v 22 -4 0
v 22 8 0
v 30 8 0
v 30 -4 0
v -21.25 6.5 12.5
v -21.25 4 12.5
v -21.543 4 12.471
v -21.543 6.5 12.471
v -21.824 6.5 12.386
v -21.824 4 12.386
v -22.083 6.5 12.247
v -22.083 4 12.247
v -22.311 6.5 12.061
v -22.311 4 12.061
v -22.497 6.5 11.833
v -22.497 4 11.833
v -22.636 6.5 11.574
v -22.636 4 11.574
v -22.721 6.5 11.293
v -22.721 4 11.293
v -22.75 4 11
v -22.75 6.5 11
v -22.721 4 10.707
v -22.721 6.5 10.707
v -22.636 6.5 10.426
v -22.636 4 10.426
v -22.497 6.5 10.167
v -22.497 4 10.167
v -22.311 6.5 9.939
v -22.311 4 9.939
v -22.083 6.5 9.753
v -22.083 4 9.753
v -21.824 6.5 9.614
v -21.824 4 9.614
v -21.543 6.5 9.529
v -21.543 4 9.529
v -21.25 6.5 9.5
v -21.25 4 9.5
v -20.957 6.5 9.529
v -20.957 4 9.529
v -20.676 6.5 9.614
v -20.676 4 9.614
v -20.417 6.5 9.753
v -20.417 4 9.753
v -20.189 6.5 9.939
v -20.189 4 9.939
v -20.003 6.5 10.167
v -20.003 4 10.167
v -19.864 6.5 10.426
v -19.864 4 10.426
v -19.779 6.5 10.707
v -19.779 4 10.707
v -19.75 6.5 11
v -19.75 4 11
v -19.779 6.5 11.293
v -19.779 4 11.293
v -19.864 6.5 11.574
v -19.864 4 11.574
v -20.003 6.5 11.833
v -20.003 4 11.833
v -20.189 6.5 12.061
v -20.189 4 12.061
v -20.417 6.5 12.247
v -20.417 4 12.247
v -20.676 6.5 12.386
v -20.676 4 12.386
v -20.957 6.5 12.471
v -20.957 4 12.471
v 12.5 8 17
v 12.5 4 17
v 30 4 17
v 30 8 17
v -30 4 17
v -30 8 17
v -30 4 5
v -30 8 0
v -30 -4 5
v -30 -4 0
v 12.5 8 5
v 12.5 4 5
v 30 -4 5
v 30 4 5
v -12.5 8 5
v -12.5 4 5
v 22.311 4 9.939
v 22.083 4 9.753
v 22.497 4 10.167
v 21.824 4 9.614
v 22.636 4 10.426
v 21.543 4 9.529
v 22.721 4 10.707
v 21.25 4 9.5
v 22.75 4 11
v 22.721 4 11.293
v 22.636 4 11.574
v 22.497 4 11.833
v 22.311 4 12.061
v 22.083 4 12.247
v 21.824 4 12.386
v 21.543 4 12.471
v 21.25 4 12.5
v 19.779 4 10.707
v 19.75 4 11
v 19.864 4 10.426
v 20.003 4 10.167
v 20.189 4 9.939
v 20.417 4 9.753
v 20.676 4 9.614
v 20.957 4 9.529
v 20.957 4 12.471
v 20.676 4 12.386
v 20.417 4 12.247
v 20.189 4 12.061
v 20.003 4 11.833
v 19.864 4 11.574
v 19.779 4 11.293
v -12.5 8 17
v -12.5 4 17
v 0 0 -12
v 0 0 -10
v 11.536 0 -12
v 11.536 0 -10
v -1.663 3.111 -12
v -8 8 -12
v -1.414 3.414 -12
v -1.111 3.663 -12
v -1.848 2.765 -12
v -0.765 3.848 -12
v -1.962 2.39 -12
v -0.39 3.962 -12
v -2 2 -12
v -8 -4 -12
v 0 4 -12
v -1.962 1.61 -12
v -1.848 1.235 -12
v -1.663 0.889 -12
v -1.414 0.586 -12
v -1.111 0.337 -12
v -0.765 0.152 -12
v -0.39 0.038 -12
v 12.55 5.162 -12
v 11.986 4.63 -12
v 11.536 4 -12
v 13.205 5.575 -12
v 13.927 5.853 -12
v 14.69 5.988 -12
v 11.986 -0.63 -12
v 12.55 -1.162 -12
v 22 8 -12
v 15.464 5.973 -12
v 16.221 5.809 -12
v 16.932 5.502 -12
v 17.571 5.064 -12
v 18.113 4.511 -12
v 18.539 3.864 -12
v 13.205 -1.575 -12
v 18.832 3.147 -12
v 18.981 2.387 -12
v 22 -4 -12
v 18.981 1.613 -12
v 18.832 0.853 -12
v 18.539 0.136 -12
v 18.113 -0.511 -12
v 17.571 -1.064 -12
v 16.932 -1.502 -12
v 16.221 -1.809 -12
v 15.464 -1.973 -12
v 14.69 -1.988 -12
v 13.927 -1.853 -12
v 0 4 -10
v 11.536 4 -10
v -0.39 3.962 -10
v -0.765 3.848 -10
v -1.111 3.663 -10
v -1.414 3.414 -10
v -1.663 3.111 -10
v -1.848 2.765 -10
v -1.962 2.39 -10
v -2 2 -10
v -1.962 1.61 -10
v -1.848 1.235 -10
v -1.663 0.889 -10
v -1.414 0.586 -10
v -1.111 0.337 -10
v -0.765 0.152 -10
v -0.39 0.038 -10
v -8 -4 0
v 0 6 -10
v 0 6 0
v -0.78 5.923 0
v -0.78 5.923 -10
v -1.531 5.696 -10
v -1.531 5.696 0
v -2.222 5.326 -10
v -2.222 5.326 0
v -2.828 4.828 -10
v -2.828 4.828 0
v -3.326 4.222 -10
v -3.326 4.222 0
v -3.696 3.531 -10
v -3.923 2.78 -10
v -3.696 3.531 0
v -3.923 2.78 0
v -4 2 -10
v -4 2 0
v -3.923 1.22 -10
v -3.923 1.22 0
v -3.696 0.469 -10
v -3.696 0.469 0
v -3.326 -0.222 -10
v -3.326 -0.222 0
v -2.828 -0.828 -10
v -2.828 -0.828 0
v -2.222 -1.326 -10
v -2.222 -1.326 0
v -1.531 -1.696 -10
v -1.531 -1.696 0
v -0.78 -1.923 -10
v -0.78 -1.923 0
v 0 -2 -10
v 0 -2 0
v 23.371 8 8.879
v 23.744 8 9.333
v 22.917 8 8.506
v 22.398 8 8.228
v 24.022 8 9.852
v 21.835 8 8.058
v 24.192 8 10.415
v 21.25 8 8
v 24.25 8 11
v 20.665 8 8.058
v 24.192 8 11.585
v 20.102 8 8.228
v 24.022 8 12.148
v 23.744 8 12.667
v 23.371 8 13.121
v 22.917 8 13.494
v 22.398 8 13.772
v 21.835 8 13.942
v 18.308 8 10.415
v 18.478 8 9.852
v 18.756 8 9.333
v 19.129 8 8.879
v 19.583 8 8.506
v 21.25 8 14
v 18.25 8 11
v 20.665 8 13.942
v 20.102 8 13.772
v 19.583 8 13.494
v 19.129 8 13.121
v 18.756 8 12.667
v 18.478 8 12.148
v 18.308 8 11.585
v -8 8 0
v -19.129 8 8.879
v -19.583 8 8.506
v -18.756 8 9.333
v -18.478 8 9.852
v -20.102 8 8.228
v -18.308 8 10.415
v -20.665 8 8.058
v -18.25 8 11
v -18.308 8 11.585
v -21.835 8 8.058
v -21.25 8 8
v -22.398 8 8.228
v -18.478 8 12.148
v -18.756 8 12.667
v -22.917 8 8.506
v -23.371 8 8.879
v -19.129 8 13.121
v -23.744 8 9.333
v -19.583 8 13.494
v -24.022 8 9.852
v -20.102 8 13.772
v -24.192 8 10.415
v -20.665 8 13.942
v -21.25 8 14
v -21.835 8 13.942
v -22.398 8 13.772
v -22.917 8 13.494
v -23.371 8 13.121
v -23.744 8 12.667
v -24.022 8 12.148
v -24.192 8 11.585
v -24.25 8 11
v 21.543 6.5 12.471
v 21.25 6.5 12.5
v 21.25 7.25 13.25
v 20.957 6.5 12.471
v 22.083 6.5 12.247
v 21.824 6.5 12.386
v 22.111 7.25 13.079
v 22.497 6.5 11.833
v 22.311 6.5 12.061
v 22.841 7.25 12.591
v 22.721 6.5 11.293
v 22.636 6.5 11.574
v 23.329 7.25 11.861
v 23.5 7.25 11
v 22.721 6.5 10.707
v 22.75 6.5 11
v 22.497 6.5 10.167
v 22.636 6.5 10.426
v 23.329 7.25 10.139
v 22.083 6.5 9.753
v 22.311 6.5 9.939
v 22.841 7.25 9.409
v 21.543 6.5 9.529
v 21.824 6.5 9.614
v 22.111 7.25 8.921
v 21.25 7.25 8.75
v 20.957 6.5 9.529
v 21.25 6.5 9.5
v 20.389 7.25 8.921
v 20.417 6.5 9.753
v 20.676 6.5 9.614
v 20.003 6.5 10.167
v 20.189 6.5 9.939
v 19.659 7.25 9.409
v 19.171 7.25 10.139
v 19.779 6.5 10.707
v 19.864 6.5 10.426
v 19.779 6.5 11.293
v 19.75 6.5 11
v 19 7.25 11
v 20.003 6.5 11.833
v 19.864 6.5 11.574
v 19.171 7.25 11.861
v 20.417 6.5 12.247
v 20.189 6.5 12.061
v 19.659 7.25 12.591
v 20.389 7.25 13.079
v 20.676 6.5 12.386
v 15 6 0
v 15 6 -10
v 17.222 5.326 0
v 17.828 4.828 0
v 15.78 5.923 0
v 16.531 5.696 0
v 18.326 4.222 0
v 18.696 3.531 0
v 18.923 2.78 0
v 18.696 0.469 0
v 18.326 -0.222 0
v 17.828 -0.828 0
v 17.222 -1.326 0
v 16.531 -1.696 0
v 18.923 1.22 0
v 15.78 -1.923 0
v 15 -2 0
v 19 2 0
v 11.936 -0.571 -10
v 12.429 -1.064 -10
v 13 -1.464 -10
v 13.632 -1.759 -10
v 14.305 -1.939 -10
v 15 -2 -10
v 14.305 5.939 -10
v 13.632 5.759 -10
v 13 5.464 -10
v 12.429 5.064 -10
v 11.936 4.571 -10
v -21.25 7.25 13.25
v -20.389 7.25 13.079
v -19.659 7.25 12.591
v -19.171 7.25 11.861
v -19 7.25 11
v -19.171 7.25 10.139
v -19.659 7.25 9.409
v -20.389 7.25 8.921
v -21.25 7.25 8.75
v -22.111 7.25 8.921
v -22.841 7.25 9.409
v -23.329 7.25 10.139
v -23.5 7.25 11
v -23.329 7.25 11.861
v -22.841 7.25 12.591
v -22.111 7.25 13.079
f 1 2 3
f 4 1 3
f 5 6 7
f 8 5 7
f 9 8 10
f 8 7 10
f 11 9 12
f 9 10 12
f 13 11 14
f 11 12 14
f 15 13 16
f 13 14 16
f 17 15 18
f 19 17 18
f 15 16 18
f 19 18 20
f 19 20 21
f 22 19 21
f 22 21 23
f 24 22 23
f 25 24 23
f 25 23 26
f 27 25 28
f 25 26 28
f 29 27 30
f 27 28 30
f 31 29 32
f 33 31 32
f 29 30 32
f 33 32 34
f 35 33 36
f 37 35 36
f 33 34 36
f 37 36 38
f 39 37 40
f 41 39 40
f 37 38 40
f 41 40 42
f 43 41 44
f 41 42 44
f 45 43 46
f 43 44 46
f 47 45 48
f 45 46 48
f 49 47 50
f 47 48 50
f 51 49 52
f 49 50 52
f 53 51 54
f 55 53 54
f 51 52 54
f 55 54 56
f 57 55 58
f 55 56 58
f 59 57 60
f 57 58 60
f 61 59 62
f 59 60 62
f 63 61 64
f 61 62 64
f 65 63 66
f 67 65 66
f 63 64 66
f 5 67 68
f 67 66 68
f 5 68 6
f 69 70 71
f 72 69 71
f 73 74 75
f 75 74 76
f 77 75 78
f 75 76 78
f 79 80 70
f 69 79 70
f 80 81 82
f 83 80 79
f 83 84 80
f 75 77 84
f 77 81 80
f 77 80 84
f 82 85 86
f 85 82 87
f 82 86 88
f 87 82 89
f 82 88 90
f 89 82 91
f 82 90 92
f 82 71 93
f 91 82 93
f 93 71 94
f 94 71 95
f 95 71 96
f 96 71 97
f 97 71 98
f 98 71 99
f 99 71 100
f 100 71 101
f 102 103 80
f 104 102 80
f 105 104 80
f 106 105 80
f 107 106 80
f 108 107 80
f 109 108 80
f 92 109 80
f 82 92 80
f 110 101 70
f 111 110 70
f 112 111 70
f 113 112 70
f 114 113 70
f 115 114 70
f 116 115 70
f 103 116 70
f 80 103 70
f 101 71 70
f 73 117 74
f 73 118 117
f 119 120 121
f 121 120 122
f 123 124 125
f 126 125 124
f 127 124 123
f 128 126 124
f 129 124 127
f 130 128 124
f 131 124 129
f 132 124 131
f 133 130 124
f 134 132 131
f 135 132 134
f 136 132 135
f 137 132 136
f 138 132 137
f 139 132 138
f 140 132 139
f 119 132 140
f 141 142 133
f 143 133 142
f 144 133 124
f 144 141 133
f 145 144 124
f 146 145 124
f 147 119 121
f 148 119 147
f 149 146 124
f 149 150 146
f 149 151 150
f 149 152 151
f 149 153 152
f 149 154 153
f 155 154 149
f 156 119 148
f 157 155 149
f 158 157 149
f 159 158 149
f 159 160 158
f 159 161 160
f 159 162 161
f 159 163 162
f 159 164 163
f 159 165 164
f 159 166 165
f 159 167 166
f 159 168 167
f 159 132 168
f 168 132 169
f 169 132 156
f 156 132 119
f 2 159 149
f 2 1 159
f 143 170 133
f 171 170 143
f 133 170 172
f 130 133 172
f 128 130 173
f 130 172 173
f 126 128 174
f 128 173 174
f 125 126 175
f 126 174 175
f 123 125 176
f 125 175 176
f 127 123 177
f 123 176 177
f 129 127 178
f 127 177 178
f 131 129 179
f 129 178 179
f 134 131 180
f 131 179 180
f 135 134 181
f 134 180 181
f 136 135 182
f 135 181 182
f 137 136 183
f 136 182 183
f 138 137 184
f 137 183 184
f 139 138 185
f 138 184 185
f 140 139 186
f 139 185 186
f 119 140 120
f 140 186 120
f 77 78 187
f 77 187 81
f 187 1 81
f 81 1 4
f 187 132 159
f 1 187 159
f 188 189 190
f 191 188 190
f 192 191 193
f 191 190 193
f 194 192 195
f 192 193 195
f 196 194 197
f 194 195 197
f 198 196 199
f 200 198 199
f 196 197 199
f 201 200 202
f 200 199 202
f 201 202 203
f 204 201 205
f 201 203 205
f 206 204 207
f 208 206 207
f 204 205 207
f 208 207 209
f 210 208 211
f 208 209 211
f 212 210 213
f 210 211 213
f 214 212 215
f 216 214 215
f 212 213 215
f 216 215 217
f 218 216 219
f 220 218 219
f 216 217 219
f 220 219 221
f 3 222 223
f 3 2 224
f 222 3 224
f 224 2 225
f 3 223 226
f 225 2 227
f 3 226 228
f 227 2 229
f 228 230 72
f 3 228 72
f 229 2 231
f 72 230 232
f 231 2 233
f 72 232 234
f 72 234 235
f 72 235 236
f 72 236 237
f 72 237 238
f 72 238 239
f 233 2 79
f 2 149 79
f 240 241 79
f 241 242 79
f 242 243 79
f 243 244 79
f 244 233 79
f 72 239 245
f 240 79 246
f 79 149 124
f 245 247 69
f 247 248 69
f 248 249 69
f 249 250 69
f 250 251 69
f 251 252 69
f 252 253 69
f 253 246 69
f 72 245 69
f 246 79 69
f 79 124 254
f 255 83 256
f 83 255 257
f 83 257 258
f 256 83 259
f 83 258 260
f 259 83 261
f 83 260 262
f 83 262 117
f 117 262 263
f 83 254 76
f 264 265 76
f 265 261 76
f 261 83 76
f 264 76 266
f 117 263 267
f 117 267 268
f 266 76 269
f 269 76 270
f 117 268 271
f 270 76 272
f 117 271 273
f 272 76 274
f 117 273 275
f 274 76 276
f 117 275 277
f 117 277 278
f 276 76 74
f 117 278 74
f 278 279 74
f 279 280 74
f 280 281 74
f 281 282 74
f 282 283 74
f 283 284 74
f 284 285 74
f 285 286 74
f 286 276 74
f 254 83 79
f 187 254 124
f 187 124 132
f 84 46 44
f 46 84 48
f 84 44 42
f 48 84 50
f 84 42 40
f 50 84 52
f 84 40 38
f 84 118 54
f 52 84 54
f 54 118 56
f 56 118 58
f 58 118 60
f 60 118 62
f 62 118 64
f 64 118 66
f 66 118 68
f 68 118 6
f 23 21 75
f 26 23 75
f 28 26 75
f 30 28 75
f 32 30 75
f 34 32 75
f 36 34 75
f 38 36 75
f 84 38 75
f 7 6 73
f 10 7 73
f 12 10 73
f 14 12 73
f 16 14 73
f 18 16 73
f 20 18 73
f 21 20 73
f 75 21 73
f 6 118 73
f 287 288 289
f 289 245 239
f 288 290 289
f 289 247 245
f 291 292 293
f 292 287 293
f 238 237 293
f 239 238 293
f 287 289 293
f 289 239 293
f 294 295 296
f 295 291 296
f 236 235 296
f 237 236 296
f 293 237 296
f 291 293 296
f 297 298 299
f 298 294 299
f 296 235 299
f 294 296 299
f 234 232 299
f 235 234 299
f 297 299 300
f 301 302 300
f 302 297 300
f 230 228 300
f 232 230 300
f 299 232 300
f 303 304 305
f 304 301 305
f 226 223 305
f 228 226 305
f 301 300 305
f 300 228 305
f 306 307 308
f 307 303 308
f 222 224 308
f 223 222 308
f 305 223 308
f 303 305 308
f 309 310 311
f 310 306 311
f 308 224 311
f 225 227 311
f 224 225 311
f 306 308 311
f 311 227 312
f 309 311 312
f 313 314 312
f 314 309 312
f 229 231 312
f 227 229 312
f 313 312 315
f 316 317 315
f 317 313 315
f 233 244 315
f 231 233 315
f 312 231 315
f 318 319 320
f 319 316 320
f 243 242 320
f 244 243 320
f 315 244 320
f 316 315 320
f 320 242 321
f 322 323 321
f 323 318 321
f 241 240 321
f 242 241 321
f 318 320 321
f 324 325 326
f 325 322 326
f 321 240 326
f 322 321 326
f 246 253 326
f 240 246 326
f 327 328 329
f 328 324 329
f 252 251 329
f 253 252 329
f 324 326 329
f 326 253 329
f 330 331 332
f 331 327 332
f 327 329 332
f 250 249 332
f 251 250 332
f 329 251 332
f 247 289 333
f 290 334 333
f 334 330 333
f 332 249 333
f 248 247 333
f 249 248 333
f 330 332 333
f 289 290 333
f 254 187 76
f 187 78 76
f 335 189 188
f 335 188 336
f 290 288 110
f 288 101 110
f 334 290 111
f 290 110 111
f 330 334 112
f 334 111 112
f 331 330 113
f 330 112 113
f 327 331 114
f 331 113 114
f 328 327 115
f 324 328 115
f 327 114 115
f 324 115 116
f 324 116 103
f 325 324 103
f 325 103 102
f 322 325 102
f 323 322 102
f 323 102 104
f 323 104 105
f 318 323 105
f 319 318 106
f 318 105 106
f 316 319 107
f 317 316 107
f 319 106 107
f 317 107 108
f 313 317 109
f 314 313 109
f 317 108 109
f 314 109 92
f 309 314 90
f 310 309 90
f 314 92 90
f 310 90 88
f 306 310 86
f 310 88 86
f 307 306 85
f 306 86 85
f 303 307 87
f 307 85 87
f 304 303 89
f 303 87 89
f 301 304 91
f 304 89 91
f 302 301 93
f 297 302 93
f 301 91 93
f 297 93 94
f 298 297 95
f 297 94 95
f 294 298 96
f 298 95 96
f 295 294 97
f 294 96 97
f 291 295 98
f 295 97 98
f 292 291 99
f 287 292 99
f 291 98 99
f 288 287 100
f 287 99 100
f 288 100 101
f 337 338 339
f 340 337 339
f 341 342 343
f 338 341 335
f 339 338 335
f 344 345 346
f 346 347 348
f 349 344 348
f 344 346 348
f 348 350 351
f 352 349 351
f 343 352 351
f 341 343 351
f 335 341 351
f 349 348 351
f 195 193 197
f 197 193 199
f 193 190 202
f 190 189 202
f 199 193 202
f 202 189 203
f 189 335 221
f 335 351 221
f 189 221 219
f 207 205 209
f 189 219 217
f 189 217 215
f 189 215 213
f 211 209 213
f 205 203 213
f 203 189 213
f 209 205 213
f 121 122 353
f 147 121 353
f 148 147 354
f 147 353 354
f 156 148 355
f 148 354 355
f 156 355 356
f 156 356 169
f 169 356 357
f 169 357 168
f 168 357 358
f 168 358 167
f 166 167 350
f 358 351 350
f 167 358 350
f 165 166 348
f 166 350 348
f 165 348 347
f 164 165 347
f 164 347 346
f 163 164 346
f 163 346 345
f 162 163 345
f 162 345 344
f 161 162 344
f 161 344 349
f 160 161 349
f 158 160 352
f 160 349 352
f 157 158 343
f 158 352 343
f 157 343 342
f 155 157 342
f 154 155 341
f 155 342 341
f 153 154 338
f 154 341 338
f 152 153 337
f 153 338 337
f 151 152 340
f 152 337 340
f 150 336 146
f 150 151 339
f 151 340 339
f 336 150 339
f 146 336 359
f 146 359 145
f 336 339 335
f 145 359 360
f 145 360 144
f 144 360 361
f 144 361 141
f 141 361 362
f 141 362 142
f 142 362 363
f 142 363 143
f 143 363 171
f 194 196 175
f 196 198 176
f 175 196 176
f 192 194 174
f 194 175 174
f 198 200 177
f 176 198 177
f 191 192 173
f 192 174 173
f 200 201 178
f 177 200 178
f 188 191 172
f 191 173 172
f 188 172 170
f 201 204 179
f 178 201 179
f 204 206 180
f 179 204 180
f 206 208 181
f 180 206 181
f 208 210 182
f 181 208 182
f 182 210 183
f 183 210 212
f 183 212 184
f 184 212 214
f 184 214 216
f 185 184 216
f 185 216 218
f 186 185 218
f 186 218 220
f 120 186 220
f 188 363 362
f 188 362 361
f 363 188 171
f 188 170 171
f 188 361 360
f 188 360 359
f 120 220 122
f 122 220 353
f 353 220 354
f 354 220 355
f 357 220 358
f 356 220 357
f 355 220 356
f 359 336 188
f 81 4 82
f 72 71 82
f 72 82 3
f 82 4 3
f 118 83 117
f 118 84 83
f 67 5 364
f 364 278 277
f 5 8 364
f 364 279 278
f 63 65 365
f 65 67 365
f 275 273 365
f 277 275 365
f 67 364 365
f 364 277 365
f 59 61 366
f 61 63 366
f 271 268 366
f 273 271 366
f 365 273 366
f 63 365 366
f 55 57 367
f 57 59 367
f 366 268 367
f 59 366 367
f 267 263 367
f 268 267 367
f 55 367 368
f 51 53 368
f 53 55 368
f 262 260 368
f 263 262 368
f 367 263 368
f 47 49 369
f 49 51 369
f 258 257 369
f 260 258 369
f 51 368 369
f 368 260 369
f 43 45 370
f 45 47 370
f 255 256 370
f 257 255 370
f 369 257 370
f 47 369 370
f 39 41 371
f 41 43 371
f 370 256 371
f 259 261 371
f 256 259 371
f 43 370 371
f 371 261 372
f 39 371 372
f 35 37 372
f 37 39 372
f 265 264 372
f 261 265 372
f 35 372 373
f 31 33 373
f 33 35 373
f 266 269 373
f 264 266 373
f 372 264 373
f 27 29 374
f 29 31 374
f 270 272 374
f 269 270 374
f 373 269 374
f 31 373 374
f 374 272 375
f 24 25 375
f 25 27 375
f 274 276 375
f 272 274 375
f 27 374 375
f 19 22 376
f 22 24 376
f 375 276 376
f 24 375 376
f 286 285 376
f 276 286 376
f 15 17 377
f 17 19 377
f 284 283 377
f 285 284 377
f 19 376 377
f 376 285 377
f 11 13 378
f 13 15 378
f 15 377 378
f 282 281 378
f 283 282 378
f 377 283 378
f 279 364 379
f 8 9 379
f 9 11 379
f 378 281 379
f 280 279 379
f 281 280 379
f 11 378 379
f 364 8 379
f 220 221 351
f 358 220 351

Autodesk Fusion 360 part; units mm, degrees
sketch "Esquisse1" plane through (0, 0, 0) normal (0, 0, 1) x (1, 0, 0)
  line L0 (30, 4) -> (-30, 4)
  line L1 (-30, 4) -> (-30, -4)
  line L2 (-30, -4) -> (30, -4)
  line L3 (30, -4) -> (30, 4)
  line L4 (30, 4) -> (-30, -4) construction
  line L5 (-30, 4) -> (30, -4) construction
  dimension "d1" = 60
  dimension "d2" = 8
extrude "Extrusion1" add sketch "Esquisse1" along normal blind 5 makes body 1
sketch "Esquisse2" plane through (0, 0, 5) normal (0, 0, 1) x (-1, 0, 0)
  line L0 (-30, 4) -> (-30, -4)
  line L1 (-30, -4) -> (30, -4)
  line L2 (30, -4) -> (30, 4)
  line L3 (30, 4) -> (-30, 4)
  line L4 (8, 4) -> (-22, 4)
  line L5 (-22, 4) -> (-22, -8)
  line L6 (-22, -8) -> (8, -8)
  line L7 (8, -8) -> (8, 4)
  line L8 (0, 12.5546) -> (0, -11.3614) construction
  line L9 (8, -2) -> (-22, -2) construction
  circle A0 centre (0, -2) radius 4
  circle A1 centre (-15, -2) radius 4
  line L10 (8, 4) -> (-22, 4)
  line L11 (0, 2) -> (-15, 2)
  line L12 (0, -6) -> (-15, -6)
  dimension "d5" = 30
  dimension "d6" = 8
  dimension "d7" = 12
  dimension "d11" = 8
  dimension "d12" = 8
  dimension "d13" = 7
extrude "Extrusion2" add sketch "Esquisse2" against normal blind 15 separate body contours L1 L3 L4 L5 L7 A0 A1 L10 L11 | L1 L5 L6 L7 A0 A1 L12 makes body 2
sketch "Esquisse3" plane through (0, 0, -10) normal (0, 0, -1) x (1, 0, 0)
  line L0 (0, 2) -> (15, 2)
  arc A0 (15, -6) -> (15, 2) centre (15, -2) ccw
  line L1 (15, -6) -> (0, -6)
  arc A1 (0, 2) -> (0, -6) centre (0, -2) ccw
  line L2 (22, 4) -> (-8, 4)
  line L3 (-8, 4) -> (-8, -8)
  line L4 (-8, -8) -> (22, -8)
  line L5 (22, -8) -> (22, 4)
  circle A2 centre (0, -2) radius 2
  circle A3 centre (15, -2) radius 4
  line L6 (0, 0) -> (11.5359, 0)
  line L7 (0, -4) -> (11.5359, -4)
  dimension "d16" = 4
  dimension "d17" = 8
extrude "Extrusion3" add sketch "Esquisse3" along normal blind 2 contours L0 L1 A1 A2 A3 L6 L7 | L2 L3 L4 L5 bodies 2
sketch "Esquisse4" plane through (0, 4, 0) normal (0, 1, 0) x (-1, 0, 0)
  line L0 (-30, 0) -> (30, 0)
  line L1 (30, 0) -> (30, 5)
  line L2 (30, 5) -> (-30, 5)
  line L3 (-30, 5) -> (-30, 0)
  line L4 (15, 10.1786) -> (15, -11.9176) construction
  line L5 (0, 1.75) -> (0, 22.5) construction
  line L6 (-30, 0) -> (-12.5, 0)
  line L7 (-12.5, 0) -> (-12.5, 17)
  line L8 (-12.5, 17) -> (-30, 17)
  line L9 (-30, 17) -> (-30, 0)
  line L10 (30, 0) -> (12.5, 0)
  line L11 (12.5, 0) -> (12.5, 17)
  line L12 (12.5, 17) -> (30, 17)
  line L13 (30, 17) -> (30, 0)
  dimension "d21" = 17
  dimension "d22" = 17
  dimension "d38" = 25
extrude "Extrusion4" add sketch "Esquisse4" along normal blind 4 contours L0 L2 L3 L6 L7 L9 | L2 L7 L8 L9 | L0 L1 L2 L10 L11 L13 | L2 L11 L12 L13 bodies 2 1
sketch "Esquisse5" plane through (0, 0, 5) normal (0, 0, 1) x (-1, 0, 0)
  arc A0 (0, -6) -> (3.4641, -4) centre (0, -2) ccw
  line L0 (0, -6) -> (-12.5, -6)
  line L1 (-12.5, -8) -> (8, -8)
  line L2 (8, -8) -> (8, -4)
  line L3 (8, -4) -> (12.5, -4)
  line L4 (12.5, -4) -> (30, -4)
  line L5 (30, -4) -> (30, 4)
  line L6 (30, 4) -> (-30, 4)
  line L7 (-30, 4) -> (-30, -4)
  line L8 (-30, -4) -> (-12.5, -4)
  line L9 (-12.5, -4) -> (3.4641, -4)
  line L10 (8, -8) -> (-22, -8)
  line L11 (-22, -8) -> (-22, -4)
  line L12 (-22, -4) -> (8, -4)
  line L13 (8, -4) -> (8, -8)
  line L14 (-12.5, -6) -> (-12.5, -8)
  point P0 (-22, 4)
extrude "Extrusion5" add sketch "Esquisse5" against normal blind 5 contours A0 L0 L8 L9 L10 L11 L12 L14 | A0 L0 L1 L2 L10 L12 L13 L14 bodies 2
sketch "Esquisse6" plane through (0, 8, 0) normal (0, 1, 0) x (-1, 0, 0)
  line L0 (30, 17) -> (12.5, 17)
  line L1 (12.5, 17) -> (12.5, 0)
  line L2 (12.5, 0) -> (30, 0)
  line L3 (30, 0) -> (30, 17)
  line L4 (30, 17) -> (12.5, 5) construction
  line L5 (12.5, 17) -> (30, 5) construction
  point P0 (21.25, 11)
  point P1 (12.5, 5)
hole "Perçage1" at (-21.25, 8, 11) direction (0, -1, 0) diameter 3 end through all countersink diameter 6 countersink angle 90 bodies 2 2
sketch "Esquisse8" plane through (0, 8, 0) normal (0, 1, 0) x (-1, 0, 0)
  line L0 (12.5, 0) -> (30, 0)
  line L1 (-30, 17) -> (-12.5, 5) construction
  line L2 (-12.5, 17) -> (-30, 5) construction
  circle A0 centre (21.25, 11) radius 3
  line L3 (30, 17) -> (12.5, 17)
  line L4 (12.5, 17) -> (12.5, 0)
  line L5 (30, 0) -> (30, 17)
  point P0 (-21.25, 11)
hole "Perçage2" at (21.25, 8, 11) direction (0, -1, 0) diameter 3 end through all countersink diameter 6 countersink angle 90 bodies 2 2
sketch "Esquisse9" plane through (-12.5, 0, 0) normal (1, 0, 0) x (0, 1, 0)
  line L0 (4, 5) -> (4, 0)
  line L1 (4, 0) -> (8, 0)
  line L2 (8, 0) -> (8, 17)
  line L3 (8, 17) -> (4, 17)
  line L4 (4, 17) -> (4, 5)
  line L5 (8, 0) -> (4, 0)
  line L6 (4, 0) -> (4, 5)
  line L7 (4, 5) -> (8, 5)
  line L8 (8, 5) -> (8, 0)
extrude "Extrusion6" add sketch "Esquisse9" along normal up to surface (4.5 mm away) contours L0 L1 L2 L5 L6 L7 L8 bodies 2
